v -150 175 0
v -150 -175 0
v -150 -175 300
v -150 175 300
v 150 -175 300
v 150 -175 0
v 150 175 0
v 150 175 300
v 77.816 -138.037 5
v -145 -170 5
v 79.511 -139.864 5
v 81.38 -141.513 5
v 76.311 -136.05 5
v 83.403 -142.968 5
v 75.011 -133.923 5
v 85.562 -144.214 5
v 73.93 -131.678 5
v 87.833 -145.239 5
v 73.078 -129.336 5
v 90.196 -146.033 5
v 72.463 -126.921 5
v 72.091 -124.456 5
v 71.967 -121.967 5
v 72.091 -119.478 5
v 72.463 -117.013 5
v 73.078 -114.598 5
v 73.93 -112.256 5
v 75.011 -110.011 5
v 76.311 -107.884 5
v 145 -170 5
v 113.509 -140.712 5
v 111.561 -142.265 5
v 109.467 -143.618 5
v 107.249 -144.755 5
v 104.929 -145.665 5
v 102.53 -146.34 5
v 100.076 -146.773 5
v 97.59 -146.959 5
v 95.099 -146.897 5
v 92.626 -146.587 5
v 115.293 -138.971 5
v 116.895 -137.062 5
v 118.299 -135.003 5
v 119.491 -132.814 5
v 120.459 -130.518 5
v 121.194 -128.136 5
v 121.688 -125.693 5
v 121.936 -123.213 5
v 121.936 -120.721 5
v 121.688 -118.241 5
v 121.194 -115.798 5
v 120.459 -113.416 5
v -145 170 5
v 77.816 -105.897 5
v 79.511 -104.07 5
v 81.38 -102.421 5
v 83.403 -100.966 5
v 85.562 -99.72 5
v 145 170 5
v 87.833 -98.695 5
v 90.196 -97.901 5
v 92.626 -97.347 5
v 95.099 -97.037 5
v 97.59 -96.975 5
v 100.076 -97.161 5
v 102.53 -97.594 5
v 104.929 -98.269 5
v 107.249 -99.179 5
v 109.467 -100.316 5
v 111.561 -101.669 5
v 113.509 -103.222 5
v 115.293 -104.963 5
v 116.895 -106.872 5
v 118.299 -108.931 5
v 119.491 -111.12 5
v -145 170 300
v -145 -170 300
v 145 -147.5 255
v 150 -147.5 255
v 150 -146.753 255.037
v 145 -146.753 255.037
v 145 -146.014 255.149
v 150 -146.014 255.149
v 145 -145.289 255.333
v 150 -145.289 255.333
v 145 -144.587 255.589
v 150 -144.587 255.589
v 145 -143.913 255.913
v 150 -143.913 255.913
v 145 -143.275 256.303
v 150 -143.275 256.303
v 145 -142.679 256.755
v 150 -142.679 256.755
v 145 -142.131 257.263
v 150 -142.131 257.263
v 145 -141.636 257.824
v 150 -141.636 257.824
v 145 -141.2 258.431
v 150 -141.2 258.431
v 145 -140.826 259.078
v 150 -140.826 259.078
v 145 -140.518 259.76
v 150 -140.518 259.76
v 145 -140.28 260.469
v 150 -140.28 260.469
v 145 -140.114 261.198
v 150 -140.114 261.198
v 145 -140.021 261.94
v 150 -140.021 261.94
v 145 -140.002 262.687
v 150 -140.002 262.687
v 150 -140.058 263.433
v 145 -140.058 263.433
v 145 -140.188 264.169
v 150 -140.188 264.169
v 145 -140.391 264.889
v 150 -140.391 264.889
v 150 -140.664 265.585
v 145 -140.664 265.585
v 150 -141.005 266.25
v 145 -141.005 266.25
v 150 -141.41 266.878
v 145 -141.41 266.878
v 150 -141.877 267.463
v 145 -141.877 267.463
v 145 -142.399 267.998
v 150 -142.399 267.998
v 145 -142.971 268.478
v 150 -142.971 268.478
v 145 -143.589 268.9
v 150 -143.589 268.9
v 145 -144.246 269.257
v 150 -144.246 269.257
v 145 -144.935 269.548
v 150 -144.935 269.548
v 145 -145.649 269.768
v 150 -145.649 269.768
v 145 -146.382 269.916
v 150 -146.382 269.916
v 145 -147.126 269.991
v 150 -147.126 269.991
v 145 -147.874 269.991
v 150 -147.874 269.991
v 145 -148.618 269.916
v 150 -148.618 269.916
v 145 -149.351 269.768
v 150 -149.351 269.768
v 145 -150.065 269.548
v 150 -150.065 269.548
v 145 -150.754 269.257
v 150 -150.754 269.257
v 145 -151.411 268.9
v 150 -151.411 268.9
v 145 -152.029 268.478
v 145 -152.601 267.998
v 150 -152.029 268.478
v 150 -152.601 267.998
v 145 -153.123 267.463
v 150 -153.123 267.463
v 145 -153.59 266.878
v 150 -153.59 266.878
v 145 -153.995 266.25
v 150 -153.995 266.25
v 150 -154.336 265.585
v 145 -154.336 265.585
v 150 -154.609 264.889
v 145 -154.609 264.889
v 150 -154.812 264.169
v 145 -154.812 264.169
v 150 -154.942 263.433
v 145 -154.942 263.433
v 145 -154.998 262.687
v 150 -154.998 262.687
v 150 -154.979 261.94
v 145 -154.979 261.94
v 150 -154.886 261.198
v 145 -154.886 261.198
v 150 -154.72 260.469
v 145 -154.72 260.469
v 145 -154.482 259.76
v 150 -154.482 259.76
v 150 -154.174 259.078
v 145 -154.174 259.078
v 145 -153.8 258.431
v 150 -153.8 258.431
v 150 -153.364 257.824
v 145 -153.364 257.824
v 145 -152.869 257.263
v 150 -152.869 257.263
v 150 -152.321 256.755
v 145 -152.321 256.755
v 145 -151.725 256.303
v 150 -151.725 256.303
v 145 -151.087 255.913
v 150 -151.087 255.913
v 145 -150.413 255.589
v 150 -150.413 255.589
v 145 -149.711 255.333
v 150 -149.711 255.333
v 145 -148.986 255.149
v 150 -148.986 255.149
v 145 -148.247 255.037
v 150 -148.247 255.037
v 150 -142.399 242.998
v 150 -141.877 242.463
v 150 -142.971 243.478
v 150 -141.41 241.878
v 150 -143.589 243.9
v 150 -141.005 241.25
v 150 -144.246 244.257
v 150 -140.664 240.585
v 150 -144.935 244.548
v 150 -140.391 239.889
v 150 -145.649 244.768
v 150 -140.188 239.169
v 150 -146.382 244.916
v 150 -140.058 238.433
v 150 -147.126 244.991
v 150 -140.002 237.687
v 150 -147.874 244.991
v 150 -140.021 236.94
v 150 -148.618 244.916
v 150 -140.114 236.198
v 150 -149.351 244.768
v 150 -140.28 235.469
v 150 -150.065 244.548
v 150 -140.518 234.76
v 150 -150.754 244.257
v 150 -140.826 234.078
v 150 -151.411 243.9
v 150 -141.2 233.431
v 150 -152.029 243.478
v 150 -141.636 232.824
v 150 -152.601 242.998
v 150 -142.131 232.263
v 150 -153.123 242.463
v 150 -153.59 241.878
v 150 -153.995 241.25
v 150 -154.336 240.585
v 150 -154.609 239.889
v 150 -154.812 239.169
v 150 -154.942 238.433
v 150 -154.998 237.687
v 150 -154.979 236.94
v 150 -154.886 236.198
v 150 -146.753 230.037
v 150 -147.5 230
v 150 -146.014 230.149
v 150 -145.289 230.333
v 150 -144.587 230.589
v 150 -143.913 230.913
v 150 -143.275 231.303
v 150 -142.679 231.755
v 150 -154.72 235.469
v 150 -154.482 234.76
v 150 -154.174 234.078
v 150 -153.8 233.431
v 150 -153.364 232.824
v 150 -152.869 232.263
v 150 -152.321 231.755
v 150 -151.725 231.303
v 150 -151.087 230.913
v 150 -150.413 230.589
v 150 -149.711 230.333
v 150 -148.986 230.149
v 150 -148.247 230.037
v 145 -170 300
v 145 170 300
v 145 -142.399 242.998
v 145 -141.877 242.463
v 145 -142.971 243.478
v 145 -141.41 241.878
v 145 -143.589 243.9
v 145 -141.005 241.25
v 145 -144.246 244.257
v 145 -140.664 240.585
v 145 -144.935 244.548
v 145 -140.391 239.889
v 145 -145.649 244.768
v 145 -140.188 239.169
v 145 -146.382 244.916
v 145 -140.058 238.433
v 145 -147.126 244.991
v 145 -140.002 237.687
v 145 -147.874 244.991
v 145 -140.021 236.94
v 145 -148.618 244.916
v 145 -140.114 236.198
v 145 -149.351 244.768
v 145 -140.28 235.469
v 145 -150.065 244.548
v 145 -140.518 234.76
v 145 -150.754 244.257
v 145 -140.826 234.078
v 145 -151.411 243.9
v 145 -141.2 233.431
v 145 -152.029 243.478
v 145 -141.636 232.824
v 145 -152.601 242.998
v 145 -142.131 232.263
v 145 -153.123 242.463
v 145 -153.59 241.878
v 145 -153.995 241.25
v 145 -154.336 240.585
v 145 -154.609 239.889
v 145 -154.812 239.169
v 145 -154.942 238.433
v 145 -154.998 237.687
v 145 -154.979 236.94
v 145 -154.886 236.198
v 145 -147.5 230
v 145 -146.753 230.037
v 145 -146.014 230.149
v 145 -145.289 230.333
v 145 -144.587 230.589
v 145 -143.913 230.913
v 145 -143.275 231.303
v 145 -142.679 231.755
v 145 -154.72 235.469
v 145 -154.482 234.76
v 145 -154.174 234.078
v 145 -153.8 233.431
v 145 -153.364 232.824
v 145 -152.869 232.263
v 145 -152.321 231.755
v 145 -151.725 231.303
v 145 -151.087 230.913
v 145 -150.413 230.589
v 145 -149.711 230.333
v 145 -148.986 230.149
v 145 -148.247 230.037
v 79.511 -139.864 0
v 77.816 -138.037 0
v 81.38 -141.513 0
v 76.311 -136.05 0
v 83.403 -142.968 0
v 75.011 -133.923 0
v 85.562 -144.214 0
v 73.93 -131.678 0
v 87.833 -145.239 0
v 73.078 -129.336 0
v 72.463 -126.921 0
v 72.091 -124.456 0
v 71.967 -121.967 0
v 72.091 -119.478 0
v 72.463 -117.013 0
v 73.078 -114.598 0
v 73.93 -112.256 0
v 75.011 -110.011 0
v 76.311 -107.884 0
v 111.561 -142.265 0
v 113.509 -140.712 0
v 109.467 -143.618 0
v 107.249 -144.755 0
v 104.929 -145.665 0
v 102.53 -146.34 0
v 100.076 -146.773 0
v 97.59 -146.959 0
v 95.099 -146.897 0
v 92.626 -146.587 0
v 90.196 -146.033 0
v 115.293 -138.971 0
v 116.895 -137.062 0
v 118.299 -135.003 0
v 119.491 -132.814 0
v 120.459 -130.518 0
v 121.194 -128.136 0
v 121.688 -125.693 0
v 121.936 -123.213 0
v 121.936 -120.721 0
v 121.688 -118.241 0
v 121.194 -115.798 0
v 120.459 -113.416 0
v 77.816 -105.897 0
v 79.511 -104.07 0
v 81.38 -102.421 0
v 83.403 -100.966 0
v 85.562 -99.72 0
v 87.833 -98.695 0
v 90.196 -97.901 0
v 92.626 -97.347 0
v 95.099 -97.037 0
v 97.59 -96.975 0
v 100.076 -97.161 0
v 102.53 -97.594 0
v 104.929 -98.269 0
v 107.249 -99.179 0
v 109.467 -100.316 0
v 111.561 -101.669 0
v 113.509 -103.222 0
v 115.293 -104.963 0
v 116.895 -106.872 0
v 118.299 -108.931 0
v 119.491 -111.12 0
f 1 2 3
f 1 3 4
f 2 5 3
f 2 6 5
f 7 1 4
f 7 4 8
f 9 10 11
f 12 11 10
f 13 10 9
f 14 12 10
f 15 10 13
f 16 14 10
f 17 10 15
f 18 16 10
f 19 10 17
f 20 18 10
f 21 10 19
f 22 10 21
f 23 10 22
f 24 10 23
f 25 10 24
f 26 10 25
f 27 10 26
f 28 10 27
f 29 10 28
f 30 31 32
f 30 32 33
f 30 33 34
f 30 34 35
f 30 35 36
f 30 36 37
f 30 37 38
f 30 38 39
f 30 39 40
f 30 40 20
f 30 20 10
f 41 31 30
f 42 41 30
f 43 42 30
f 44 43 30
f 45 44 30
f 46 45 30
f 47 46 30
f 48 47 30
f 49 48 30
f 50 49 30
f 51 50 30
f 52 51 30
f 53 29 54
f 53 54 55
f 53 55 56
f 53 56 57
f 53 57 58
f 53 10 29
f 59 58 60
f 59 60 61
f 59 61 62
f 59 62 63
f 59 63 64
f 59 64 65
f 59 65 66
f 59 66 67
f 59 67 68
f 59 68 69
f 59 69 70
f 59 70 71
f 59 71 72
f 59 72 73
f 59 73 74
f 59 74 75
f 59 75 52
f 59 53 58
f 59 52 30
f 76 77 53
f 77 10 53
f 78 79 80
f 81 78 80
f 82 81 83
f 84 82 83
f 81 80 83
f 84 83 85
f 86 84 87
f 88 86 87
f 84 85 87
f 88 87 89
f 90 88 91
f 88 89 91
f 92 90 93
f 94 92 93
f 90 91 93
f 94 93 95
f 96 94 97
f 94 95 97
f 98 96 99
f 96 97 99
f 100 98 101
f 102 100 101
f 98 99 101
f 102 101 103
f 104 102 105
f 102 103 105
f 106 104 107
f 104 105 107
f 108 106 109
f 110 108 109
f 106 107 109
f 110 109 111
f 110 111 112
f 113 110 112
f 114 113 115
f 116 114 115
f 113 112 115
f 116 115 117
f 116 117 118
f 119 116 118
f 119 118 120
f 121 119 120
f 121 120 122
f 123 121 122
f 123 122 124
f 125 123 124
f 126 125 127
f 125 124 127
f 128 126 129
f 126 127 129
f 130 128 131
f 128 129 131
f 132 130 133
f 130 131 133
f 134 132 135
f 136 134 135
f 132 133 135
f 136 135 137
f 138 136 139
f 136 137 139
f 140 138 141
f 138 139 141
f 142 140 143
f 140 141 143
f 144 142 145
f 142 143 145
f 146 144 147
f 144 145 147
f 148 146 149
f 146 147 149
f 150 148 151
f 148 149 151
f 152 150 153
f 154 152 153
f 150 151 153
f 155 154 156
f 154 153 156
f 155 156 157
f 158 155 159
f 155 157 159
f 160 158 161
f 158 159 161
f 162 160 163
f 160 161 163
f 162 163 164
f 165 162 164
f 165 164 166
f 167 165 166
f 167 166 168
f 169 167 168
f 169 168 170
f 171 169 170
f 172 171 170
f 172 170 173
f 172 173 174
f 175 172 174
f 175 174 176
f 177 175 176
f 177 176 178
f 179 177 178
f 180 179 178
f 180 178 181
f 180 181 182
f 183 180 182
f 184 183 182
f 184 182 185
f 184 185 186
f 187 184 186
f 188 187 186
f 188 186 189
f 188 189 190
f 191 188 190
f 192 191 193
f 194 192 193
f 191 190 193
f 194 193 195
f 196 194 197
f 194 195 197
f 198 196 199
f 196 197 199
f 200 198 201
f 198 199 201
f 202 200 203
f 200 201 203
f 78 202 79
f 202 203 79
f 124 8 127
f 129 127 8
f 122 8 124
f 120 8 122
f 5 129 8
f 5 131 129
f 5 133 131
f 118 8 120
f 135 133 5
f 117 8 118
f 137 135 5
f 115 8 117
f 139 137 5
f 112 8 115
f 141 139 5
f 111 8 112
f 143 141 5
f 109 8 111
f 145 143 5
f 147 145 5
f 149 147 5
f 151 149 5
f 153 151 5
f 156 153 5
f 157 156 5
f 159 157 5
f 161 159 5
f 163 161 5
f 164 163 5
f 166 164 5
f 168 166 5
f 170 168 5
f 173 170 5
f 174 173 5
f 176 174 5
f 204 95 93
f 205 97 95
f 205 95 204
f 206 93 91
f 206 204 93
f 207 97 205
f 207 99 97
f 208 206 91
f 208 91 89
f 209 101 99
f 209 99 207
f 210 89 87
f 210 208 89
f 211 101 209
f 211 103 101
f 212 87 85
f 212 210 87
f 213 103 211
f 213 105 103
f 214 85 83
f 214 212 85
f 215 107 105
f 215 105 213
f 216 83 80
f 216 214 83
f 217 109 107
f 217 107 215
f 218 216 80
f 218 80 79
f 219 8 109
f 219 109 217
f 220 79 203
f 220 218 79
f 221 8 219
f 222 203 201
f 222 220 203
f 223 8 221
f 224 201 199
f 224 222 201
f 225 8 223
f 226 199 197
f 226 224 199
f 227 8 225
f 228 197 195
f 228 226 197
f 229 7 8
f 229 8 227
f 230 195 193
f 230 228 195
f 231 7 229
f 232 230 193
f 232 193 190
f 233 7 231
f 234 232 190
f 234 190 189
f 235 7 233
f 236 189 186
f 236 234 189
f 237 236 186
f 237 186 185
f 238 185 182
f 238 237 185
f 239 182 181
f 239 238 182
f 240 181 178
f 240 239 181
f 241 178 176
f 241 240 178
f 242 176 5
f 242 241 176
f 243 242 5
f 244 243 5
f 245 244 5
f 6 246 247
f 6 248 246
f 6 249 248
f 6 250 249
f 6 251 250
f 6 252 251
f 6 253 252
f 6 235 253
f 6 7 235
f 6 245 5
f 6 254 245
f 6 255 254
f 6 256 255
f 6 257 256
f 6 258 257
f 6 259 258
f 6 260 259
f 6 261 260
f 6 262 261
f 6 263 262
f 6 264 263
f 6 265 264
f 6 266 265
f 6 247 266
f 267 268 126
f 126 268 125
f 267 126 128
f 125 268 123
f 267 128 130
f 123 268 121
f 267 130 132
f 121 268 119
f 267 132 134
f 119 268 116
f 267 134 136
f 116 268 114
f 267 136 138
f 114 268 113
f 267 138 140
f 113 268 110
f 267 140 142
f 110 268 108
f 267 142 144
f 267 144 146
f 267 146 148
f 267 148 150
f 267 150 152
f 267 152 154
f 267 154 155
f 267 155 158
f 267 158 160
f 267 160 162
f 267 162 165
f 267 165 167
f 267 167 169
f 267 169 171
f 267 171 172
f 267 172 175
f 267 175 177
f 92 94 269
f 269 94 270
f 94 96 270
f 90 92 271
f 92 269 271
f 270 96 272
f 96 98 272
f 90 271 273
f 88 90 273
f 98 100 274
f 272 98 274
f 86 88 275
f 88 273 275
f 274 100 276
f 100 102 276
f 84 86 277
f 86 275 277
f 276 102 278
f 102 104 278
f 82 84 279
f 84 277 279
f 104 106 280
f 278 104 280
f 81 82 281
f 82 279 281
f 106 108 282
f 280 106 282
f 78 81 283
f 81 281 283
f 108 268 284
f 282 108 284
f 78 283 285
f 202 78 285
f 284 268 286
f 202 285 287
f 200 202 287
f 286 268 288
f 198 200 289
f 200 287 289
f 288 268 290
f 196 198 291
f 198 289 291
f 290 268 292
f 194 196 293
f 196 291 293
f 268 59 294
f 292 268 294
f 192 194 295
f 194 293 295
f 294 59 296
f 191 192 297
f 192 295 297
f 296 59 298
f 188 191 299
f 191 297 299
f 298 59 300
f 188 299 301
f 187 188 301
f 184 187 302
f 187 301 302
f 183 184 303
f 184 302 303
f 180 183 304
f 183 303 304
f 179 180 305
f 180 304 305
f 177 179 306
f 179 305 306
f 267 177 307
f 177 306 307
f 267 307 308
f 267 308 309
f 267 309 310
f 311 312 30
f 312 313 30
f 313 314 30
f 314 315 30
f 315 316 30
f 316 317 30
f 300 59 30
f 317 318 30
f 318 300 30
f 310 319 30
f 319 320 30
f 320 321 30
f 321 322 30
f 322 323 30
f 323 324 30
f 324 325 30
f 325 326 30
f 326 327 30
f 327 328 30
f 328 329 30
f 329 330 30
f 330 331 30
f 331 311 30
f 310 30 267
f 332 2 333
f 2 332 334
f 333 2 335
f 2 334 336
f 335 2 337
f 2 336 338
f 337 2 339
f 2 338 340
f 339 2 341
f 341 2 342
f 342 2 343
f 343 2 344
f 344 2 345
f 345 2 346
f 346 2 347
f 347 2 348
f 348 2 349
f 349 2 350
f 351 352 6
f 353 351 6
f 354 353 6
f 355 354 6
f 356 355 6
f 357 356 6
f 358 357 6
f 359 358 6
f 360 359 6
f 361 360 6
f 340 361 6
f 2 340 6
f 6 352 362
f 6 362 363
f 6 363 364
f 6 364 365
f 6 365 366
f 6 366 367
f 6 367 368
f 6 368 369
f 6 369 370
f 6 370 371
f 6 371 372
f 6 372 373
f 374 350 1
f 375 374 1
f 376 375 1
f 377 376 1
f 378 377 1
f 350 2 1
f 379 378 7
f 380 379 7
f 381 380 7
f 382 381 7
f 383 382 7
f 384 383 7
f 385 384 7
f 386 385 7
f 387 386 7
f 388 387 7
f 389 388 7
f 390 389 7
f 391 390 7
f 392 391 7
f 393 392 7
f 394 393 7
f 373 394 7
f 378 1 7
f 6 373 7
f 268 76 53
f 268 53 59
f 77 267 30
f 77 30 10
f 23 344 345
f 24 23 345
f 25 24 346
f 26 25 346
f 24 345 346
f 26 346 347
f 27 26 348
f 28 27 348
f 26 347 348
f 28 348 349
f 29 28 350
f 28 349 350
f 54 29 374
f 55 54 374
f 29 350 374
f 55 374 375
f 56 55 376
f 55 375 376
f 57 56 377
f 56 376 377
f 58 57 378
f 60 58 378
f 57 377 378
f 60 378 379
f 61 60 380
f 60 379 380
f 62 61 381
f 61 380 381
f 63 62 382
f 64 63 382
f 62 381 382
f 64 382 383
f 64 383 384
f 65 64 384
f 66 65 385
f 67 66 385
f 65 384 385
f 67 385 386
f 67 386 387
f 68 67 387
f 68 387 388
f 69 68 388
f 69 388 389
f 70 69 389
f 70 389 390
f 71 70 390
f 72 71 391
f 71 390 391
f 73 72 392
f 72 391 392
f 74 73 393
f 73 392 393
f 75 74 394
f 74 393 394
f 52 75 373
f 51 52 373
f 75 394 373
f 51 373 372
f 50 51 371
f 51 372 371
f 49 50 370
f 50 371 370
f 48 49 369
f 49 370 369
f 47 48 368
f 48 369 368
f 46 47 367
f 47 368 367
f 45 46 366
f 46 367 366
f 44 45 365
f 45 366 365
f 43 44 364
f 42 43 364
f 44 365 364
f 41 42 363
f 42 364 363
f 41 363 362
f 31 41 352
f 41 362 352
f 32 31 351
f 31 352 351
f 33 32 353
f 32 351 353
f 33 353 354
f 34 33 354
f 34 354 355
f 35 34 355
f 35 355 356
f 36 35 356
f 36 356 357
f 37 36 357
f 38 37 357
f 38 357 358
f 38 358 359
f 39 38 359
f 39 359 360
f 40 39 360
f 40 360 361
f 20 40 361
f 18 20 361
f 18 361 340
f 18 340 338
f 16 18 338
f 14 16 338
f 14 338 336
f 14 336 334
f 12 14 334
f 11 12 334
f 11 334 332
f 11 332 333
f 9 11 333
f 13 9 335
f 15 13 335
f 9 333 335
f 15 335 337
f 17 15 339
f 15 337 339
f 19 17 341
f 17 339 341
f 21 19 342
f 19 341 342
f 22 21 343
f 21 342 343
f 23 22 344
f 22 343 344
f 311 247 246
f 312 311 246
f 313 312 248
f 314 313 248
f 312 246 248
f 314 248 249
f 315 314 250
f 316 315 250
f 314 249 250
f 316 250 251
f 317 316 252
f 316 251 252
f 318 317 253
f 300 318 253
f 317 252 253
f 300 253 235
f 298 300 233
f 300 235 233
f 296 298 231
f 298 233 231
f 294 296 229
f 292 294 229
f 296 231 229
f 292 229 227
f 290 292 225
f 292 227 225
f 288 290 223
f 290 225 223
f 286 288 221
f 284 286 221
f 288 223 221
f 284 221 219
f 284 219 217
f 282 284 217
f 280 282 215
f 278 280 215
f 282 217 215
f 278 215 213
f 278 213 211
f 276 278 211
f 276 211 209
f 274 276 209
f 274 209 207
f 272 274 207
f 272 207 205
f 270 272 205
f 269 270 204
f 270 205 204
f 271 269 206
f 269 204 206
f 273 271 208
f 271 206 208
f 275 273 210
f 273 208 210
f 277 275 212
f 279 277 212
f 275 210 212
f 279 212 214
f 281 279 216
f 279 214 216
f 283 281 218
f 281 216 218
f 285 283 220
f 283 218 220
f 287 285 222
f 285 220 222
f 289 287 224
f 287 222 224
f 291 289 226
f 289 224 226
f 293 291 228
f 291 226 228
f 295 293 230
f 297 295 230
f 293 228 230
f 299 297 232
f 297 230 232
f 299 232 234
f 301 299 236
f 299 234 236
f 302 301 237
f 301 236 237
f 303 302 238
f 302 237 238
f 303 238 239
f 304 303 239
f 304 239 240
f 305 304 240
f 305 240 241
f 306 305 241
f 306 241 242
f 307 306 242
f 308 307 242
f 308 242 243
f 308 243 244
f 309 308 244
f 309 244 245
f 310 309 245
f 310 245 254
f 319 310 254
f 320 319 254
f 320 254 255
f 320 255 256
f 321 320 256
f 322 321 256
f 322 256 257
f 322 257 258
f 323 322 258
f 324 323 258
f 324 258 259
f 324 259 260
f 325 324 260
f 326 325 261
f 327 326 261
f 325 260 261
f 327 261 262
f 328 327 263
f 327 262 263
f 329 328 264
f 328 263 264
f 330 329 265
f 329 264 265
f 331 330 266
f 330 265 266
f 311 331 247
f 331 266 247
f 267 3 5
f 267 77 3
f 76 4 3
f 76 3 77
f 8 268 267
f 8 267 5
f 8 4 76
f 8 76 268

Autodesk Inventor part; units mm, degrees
ref_plane "YZ Plane" through (0, 0, 0) normal (1, 0, 0) x (0, 1, 0)
ref_plane "XZ Plane" through (0, 0, 0) normal (0, 1, 0) x (-1, 0, 0)
ref_plane "XY Plane" through (0, 0, 0) normal (0, 0, 1) x (1, 0, 0)
sketch "Sketch2" plane through (0, 0, 0) normal (0, 0, 1) x (1, 0, 0)
  line L0 (150, -175) -> (-150, -175)
  line L1 (-150, -175) -> (-150, 175)
  line L2 (-150, 175) -> (150, 175)
  line L3 (150, 175) -> (150, -175)
  line L4 (150, -175) -> (-150, 175) construction
  line L5 (-150, -175) -> (150, 175) construction
  point P0 (0, 0)
  dimension "d0" = 300
  dimension "d1" = 350
extrude "Base" add sketch "Sketch2" along normal blind 300
shell "Shell1" thickness 5 removed faces 1 at (50, -58.3333, 300)
sketch "Sketch3" plane through (150, -175, 0) normal (1, 0, 0) x (0, 0, -1)
  circle A0 centre (-262.5, 27.5) radius 7.5
  line L0 (-300, 350) -> (-300, 0) projected
  line L1 (0, 0) -> (-300, 0) projected
  circle A1 centre (-237.5, 27.5) radius 7.5
  point P0 (0, 175)
  dimension "d5" = 15
  dimension "d9" = 37.5
  dimension "d10" = 27.5
  dimension "d13" = 25
extrude "Wire holes" cut sketch "Sketch3" against normal up to surface (5 mm away)
sketch "Sketch4" plane through (0, 0, 0) normal (0, 0, -1) x (-1, 0, 0)
  circle A0 centre (-96.967, -121.967) radius 25
  line L0 (-150, -175) -> (-96.967, -121.967) construction
  line L1 (-150, -175) -> (-75, -175) construction
  point P0 (0, 0)
  dimension "d20" = 50
  dimension "d21" = 75
  dimension "d22" = 45
extrude "Exhaust" cut sketch "Sketch4" against normal up to surface (5 mm away)
properties part number "mouse_SP_inner"
